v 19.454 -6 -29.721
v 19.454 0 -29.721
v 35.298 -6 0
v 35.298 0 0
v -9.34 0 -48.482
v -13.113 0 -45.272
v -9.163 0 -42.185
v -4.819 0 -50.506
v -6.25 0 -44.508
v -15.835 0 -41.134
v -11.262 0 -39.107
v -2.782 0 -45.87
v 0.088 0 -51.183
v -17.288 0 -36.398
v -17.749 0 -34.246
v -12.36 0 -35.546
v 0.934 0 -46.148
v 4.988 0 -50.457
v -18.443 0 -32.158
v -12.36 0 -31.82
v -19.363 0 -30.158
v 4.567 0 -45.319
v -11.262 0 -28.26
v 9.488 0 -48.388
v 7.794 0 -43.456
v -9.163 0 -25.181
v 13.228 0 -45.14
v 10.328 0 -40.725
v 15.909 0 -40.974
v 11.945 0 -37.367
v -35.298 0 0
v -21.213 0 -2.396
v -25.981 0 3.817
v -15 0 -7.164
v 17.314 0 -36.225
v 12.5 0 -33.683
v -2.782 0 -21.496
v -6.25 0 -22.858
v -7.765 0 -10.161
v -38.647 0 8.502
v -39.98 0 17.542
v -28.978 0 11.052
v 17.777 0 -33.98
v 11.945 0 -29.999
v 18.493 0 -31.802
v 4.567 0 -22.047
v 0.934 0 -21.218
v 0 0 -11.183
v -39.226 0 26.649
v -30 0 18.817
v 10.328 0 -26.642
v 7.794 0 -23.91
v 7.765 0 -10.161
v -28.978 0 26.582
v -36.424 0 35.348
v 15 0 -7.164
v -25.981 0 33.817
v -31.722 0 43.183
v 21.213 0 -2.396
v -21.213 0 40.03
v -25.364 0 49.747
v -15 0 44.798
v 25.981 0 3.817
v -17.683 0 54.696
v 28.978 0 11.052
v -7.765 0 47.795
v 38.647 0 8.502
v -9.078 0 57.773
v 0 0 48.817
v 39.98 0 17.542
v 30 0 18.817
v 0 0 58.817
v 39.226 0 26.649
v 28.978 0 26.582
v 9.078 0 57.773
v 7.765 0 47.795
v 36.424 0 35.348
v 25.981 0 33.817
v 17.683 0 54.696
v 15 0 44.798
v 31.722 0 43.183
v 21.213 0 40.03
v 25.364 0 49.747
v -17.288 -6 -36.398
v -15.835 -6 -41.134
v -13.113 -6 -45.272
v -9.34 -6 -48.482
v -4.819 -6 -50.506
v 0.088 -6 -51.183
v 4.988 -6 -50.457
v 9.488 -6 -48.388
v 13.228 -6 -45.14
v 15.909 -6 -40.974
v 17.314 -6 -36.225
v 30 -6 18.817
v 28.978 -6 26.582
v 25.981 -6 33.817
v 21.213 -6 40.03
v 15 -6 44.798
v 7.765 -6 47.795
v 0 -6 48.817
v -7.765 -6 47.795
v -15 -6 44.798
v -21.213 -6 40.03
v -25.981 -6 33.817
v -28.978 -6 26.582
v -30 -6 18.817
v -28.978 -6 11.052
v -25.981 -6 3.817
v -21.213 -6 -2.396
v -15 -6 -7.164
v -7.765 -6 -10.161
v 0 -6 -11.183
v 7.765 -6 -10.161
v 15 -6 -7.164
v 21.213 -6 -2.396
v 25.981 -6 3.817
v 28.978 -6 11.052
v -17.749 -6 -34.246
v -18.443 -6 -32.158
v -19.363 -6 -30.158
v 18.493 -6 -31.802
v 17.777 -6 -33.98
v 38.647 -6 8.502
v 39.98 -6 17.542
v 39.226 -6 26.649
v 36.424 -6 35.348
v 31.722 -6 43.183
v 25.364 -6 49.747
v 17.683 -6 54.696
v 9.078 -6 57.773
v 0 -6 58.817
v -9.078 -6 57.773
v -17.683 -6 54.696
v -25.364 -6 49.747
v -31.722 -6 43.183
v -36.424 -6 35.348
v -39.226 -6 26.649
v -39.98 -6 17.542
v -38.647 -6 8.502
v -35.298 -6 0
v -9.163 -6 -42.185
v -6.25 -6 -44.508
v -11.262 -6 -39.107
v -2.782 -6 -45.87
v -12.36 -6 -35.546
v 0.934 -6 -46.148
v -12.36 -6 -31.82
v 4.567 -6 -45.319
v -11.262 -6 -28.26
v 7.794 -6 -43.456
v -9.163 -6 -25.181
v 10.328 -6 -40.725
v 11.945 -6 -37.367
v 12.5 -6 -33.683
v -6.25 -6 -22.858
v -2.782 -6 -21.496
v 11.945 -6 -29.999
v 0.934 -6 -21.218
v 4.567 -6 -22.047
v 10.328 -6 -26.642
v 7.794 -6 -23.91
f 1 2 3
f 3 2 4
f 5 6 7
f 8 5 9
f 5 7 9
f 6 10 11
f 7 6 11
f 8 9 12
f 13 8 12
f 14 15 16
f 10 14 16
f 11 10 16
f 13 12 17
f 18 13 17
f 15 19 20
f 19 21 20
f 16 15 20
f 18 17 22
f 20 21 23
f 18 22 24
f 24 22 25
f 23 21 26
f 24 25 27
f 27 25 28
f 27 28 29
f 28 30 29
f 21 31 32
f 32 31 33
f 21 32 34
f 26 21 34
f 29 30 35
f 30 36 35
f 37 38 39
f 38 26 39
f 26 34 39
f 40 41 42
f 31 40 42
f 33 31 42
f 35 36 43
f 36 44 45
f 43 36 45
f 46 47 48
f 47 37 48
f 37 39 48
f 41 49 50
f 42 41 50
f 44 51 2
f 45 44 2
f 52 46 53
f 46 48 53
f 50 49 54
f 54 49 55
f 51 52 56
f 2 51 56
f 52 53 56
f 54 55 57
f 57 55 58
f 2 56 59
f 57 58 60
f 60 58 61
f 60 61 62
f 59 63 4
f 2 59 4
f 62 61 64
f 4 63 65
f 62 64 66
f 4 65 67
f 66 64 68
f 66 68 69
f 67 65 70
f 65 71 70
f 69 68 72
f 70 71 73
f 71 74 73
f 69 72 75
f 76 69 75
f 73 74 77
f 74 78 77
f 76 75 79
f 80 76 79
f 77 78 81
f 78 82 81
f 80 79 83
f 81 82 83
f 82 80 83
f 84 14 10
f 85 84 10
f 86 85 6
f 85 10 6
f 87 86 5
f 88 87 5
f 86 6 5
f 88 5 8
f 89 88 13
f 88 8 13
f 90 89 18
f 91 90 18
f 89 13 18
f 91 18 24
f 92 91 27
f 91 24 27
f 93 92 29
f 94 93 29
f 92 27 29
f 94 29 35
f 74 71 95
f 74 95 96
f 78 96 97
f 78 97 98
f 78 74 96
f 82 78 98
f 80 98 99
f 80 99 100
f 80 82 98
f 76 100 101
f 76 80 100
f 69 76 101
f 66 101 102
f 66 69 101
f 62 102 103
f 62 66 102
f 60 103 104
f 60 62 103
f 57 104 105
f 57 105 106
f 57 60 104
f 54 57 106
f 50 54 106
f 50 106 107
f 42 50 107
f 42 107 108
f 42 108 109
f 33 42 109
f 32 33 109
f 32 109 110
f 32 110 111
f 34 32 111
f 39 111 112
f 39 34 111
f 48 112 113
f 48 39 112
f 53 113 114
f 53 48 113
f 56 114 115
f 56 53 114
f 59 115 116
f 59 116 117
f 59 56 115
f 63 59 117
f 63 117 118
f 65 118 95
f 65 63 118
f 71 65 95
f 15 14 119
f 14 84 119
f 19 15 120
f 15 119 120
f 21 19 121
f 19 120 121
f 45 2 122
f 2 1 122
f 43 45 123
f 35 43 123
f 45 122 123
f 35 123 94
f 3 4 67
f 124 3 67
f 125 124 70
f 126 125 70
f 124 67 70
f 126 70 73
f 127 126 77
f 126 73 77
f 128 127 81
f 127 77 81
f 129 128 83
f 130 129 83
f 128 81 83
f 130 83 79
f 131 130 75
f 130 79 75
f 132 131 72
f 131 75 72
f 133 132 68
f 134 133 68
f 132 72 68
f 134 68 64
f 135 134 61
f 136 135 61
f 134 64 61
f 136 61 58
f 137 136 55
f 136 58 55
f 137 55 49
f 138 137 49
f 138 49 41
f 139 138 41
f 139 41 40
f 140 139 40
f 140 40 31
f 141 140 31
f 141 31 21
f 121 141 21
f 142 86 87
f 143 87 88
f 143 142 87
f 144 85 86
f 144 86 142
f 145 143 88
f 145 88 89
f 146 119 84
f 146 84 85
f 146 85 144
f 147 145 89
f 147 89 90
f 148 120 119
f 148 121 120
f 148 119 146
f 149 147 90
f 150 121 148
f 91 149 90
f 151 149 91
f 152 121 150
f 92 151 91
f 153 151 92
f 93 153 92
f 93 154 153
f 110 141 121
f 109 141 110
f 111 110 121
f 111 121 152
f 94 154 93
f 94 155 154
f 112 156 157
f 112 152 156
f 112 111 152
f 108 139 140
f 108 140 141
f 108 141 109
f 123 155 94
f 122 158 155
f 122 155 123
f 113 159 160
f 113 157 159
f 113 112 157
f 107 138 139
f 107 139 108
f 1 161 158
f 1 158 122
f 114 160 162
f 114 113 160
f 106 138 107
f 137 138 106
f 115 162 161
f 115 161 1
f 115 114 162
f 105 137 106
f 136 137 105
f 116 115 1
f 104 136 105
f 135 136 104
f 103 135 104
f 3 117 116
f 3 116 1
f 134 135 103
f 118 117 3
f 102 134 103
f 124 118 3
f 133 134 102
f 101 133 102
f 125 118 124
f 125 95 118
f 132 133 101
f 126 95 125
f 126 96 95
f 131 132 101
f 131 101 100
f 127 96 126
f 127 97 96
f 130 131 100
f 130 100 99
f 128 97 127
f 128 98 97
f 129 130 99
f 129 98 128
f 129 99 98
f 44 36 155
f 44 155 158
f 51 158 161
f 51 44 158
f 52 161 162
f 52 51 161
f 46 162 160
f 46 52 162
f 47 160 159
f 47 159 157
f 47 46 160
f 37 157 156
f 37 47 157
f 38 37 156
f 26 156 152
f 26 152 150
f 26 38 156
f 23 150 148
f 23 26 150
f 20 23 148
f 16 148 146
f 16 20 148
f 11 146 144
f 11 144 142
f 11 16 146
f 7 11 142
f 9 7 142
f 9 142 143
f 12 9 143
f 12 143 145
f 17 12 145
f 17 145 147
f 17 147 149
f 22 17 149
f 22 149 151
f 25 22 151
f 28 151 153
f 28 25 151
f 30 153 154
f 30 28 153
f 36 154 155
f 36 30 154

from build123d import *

# Parameters (mm, degrees)
F0_R     = 12.5
F0_R_2   = 30
F1_DEPTH = 6
F2_R     = 20


with BuildPart() as f1:
    # F0 (on Front) → F1 (new body)
    with BuildSketch(Plane.XZ):
        with BuildLine():
            Line((17.497548, -33.390142), (35.297627, 0))
            ThreePointArc((35.297627, 0), (0, 58.816947), (-35.297627, 0))
            Line((-35.297627, 0), (-17.5, -33.683053))
            ThreePointArc((-17.5, -33.683053), (0.14646, -51.18244), (17.497548, -33.390142))
        make_face()
        with Locations((0, -33.683053)):
            Circle(F0_R, mode=Mode.SUBTRACT)
        with Locations((0, 18.816947)):
            Circle(F0_R_2, mode=Mode.SUBTRACT)
    extrude(amount=F1_DEPTH)

    # F2
    f2_edges = [f1.edges().sort_by_distance(p)[0] for p in [
        (17.497548, -3, -33.390142),
        (-17.5, -3, -33.683053),
    ]]
    fillet(f2_edges, radius=F2_R)


solid = f1.part
